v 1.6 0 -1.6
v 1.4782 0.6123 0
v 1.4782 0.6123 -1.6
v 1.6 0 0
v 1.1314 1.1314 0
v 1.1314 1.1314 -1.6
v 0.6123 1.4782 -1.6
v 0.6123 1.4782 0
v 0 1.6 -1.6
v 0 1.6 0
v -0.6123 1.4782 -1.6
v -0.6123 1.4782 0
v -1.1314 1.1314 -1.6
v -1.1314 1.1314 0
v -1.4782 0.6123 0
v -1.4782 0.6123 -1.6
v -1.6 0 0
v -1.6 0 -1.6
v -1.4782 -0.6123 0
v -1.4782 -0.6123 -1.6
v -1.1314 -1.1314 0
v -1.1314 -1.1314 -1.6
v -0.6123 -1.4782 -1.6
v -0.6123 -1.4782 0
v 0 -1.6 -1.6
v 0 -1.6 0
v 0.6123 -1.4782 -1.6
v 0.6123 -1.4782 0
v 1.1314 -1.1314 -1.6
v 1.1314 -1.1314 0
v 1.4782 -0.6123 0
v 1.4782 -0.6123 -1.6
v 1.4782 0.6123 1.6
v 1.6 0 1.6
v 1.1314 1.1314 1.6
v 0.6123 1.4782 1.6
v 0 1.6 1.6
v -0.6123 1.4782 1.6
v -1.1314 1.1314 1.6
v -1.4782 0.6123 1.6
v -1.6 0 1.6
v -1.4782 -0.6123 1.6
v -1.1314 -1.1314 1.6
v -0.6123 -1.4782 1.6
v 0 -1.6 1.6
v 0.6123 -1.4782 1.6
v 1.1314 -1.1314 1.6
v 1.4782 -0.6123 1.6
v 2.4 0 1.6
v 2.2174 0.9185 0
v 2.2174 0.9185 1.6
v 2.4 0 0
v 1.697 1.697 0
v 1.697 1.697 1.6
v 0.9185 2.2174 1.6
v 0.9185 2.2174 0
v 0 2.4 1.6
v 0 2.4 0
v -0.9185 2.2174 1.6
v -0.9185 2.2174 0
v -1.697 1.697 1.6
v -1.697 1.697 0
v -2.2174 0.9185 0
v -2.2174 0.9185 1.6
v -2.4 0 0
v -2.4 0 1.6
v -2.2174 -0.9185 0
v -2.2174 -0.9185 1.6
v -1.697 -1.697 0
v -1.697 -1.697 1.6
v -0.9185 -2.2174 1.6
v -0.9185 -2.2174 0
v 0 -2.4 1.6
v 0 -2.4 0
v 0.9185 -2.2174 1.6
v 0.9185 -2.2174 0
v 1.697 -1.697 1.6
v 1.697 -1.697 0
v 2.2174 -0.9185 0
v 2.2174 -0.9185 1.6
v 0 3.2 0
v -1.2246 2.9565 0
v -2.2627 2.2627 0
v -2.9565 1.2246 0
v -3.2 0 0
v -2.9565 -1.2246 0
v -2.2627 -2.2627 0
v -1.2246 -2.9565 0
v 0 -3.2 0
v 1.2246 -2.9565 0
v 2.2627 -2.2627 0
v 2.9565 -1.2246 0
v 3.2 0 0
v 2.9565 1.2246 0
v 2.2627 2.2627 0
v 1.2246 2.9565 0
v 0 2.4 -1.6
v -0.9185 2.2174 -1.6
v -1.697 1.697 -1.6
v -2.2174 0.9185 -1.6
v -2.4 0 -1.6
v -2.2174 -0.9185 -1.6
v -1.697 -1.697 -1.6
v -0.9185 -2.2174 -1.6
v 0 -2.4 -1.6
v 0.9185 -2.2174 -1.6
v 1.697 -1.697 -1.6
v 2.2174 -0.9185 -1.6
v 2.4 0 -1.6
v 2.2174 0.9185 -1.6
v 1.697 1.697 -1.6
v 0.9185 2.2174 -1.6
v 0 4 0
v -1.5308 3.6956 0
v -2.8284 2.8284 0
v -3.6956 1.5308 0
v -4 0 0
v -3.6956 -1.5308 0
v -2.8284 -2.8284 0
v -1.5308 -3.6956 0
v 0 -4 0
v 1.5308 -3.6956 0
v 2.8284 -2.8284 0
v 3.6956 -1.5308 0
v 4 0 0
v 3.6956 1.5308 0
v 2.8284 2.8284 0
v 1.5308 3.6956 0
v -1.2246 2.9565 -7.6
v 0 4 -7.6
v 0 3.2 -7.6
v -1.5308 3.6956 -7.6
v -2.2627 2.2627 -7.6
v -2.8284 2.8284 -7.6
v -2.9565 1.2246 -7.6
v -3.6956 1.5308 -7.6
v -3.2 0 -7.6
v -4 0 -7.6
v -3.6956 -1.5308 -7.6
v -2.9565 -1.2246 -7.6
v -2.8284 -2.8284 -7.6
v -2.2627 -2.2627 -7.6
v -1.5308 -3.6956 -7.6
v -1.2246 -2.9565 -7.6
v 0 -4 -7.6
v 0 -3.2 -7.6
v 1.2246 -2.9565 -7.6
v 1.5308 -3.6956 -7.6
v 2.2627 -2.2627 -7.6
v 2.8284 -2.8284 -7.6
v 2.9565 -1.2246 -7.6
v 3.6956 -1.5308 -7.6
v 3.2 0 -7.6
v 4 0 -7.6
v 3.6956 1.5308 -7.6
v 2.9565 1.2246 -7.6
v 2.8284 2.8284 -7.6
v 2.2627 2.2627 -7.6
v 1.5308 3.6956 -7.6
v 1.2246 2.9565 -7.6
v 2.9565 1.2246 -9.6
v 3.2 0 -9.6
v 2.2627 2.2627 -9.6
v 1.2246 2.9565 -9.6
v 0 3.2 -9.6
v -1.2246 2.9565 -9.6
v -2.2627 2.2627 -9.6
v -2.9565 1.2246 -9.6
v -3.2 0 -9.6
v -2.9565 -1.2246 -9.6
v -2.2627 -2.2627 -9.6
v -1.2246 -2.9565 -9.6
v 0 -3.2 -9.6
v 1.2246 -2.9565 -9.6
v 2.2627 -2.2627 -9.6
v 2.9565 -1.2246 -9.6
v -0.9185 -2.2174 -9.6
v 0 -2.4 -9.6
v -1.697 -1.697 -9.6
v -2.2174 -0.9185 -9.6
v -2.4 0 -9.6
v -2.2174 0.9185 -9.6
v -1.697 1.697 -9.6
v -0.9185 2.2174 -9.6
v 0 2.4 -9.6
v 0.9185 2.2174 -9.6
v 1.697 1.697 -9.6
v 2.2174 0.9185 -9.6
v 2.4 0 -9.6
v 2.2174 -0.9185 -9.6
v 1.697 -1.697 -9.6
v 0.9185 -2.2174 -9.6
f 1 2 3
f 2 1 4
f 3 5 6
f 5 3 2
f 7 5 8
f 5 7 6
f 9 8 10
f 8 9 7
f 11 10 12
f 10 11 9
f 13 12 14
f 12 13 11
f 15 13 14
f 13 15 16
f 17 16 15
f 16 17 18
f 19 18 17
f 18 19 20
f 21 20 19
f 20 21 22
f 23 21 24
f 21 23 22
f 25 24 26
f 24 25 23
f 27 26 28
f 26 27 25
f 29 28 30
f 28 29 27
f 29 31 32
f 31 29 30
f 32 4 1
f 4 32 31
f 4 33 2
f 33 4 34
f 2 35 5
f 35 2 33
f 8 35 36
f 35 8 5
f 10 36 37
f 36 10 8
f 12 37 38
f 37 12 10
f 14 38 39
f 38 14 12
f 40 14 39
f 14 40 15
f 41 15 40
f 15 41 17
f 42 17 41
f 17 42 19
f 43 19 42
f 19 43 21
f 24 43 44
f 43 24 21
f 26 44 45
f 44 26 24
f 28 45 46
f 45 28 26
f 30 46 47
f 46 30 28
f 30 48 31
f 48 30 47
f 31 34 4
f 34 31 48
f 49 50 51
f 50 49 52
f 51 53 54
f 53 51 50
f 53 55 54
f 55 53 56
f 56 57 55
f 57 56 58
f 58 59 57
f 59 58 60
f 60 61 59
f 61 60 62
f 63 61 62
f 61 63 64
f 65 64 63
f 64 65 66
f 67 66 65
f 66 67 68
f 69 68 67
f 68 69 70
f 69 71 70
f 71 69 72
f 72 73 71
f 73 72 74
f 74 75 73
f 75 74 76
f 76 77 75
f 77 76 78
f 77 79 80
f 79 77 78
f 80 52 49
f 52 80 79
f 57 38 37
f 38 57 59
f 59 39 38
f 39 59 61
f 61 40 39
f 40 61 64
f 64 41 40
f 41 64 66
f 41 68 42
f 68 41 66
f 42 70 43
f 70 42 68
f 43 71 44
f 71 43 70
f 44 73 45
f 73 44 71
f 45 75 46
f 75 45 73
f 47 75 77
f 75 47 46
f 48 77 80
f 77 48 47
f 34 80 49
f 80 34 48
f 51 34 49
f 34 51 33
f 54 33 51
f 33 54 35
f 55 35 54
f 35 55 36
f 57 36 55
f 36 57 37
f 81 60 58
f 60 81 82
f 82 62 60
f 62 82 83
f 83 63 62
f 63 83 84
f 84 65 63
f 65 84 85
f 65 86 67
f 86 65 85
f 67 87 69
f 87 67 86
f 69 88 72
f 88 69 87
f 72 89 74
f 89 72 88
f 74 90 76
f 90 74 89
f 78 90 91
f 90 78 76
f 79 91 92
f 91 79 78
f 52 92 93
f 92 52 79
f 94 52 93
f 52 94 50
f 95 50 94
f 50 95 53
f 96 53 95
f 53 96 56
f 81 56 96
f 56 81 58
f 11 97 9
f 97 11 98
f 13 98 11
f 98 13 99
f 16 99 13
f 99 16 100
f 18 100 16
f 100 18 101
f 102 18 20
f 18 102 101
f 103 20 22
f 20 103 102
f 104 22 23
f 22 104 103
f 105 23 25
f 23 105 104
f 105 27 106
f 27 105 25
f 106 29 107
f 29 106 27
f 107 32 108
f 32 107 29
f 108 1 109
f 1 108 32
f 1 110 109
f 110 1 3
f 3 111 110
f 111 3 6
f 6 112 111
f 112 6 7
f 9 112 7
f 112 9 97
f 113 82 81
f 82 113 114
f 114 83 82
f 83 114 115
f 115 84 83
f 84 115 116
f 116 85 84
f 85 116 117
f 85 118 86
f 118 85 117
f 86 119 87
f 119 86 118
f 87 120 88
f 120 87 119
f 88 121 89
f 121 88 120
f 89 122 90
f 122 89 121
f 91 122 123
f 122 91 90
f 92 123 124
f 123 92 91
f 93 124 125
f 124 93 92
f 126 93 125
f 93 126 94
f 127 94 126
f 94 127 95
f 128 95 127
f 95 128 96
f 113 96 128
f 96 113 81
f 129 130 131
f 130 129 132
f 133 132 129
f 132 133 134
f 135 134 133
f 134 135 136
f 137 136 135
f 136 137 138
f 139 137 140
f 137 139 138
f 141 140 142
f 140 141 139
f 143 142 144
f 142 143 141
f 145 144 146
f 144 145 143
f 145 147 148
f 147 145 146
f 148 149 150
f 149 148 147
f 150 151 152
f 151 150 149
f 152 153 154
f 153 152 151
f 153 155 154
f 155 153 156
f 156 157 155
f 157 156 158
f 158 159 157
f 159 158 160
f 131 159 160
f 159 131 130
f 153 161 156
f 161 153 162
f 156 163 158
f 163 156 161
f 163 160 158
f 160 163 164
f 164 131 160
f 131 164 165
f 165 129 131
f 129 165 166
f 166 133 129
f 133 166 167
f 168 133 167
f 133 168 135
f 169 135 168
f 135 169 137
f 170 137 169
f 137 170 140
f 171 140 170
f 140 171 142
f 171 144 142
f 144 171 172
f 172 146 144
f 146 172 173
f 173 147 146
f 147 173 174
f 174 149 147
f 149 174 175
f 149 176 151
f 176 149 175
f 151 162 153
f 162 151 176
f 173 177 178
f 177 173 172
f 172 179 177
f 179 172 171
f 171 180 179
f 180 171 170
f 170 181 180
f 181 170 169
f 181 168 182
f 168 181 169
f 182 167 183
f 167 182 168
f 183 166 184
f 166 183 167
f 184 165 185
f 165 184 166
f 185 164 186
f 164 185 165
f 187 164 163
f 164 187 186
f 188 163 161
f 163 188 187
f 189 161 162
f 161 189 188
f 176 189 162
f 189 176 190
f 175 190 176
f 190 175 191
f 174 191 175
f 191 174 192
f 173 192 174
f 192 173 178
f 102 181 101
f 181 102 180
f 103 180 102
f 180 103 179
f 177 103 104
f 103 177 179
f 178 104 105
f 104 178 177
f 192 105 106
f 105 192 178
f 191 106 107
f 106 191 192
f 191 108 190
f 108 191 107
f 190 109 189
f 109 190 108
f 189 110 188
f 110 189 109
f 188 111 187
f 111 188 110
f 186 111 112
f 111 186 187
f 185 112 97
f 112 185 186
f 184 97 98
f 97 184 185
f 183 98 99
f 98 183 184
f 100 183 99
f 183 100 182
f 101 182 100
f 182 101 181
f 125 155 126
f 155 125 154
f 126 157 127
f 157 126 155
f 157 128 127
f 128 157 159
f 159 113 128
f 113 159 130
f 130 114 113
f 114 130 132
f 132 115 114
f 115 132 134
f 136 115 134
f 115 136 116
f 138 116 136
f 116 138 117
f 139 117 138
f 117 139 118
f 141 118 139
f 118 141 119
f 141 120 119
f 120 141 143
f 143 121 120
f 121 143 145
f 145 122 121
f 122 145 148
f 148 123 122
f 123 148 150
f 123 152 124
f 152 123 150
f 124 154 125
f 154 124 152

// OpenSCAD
// file: ../p/stud4od.scad
use <../lib.scad>
use <4-4cylo.scad>
use <4-4ring3.scad>
function ldraw_lib__stud4od() = [
// 0 Stud Tube Open without Outer Cylinder and Top Surface
// 0 Name: stud4od.dat
// 0 Author: Philippe Hurbain [Philo]
// 0 !LDRAW_ORG Primitive UPDATE 2013-02
// 0 !LICENSE Licensed under CC BY 2.0 and CC BY 4.0 : see CAreadme.txt
// 
// 0 !HELP This stud is a "antistud" to be used like a underside stud,
// 0 !HELP but without the outer cylinder.
// 0 !HELP 1 47 0 0 0 1 0 0 0 1 0 0 0 1 stud4.dat
// 
// 0 BFC CERTIFY CCW
  [0,"BFC","CERTIFY"],
  [0,"BFC","CCW"],
// 
// 0 !HISTORY 2013-12-23 [PTadmin] Official Update 2013-02
// 
// 
// 1 16 0 -4 0 2 0 0 0 1 0 0 0 2 4-4ring3.dat
  [1,16,0,-4,0,2,0,0,0,1,0,0,0,2, ldraw_lib__4_4ring3()],
// 0 BFC INVERTNEXT
  [0,"BFC","INVERTNEXT"],
// 1 16 0 0 0 -6 0 0 0 -4 0 0 0 6 4-4cylo.dat
  [1,16,0,0,0,-6,0,0,0,-4,0,0,0,6, ldraw_lib__4_4cylo()],
];
makepoly(ldraw_lib__stud4od(), line=0.2);
// file: ../p/stud2a.scad
use <../lib.scad>
use <4-4cyli.scad>
use <4-4edge.scad>
use <4-4ring2.scad>
function ldraw_lib__stud2a() = [
// 0 Stud Open without Base Edges
// 0 Name: stud2a.dat
// 0 Author: James Jessiman
// 0 !LDRAW_ORG Primitive UPDATE 2009-02
// 0 !LICENSE Licensed under CC BY 2.0 and CC BY 4.0 : see CAreadme.txt
// 
// 0 BFC CERTIFY CCW
  [0,"BFC","CERTIFY"],
  [0,"BFC","CCW"],
// 
// 0 !HISTORY 1999-07-05 [PTadmin] Official Update 1999-05
// 0 !HISTORY 2002-04-04 [sbliss] Modified for BFC compliance
// 0 !HISTORY 2002-04-25 [PTadmin] Official Update 2002-02
// 0 !HISTORY 2007-06-24 [PTadmin] Header formatted for Contributor Agreement
// 0 !HISTORY 2008-07-01 [PTadmin] Official Update 2008-01
// 0 !HISTORY 2009-06-21 [cwdee] Update ring references to 4-4ring
// 0 !HISTORY 2009-09-03 [PTadmin] Official Update 2009-02
// 
// 
// 1 16 0 -4 0 4 0 0 0 1 0 0 0 4 4-4edge.dat
  [1,16,0,-4,0,4,0,0,0,1,0,0,0,4, ldraw_lib__4_4edge()],
// 1 16 0 -4 0 6 0 0 0 1 0 0 0 6 4-4edge.dat
  [1,16,0,-4,0,6,0,0,0,1,0,0,0,6, ldraw_lib__4_4edge()],
// 0 BFC INVERTNEXT
  [0,"BFC","INVERTNEXT"],
// 1 16 0 -4 0 4 0 0 0 4 0 0 0 4 4-4cyli.dat
  [1,16,0,-4,0,4,0,0,0,4,0,0,0,4, ldraw_lib__4_4cyli()],
// 1 16 0 -4 0 6 0 0 0 4 0 0 0 6 4-4cyli.dat
  [1,16,0,-4,0,6,0,0,0,4,0,0,0,6, ldraw_lib__4_4cyli()],
// 1 16 0 -4 0 2 0 0 0 1 0 0 0 2 4-4ring2.dat
  [1,16,0,-4,0,2,0,0,0,1,0,0,0,2, ldraw_lib__4_4ring2()],
// 0
];
makepoly(ldraw_lib__stud2a(), line=0.2);
// file: ../p/4-4ring4.scad
use <../lib.scad>
function ldraw_lib__4_4ring4() = [
// 0 Ring  4 x 1.0
// 0 Name: 4-4ring4.dat
// 0 Author: James Jessiman
// 0 !LDRAW_ORG Primitive UPDATE 2009-01
// 0 !LICENSE Licensed under CC BY 2.0 and CC BY 4.0 : see CAreadme.txt
// 
// 0 BFC CERTIFY CCW
  [0,"BFC","CERTIFY"],
  [0,"BFC","CCW"],
// 
// 0 !HISTORY 1998-12-15 [PTadmin] Official Update 1998-10
// 0 !HISTORY 2002-04-08 [BrickCaster] Modified for BFC compliance
// 0 !HISTORY 2002-04-25 [PTadmin] Official Update 2002-02
// 0 !HISTORY 2007-06-24 [PTadmin] Header formatted for Contributor Agreement
// 0 !HISTORY 2008-07-01 [PTadmin] Official Update 2008-01
// 0 !HISTORY 2008-08-26 [cwdee] Switch polygon winding and rename
// 0 !HISTORY 2009-05-02 [PTadmin] Official Update 2009-01
// 
// 
// 4 16 -1.9135 0 4.6195 -1.5308 0 3.6956 0 0 4 0 0 5
  [4,16,-1.9135,0,4.6195,-1.5308,0,3.6956,0,0,4,0,0,5],
// 4 16 -3.5355 0 3.5355 -2.8284 0 2.8284 -1.5308 0 3.6956 -1.9135 0 4.6195
  [4,16,-3.5355,0,3.5355,-2.8284,0,2.8284,-1.5308,0,3.6956,-1.9135,0,4.6195],
// 4 16 -4.6195 0 1.9135 -3.6956 0 1.5308 -2.8284 0 2.8284 -3.5355 0 3.5355
  [4,16,-4.6195,0,1.9135,-3.6956,0,1.5308,-2.8284,0,2.8284,-3.5355,0,3.5355],
// 4 16 -5 0 0 -4 0 0 -3.6956 0 1.5308 -4.6195 0 1.9135
  [4,16,-5,0,0,-4,0,0,-3.6956,0,1.5308,-4.6195,0,1.9135],
// 4 16 -4.6195 0 -1.9135 -3.6956 0 -1.5308 -4 0 0 -5 0 0
  [4,16,-4.6195,0,-1.9135,-3.6956,0,-1.5308,-4,0,0,-5,0,0],
// 4 16 -3.5355 0 -3.5355 -2.8284 0 -2.8284 -3.6956 0 -1.5308 -4.6195 0 -1.9135
  [4,16,-3.5355,0,-3.5355,-2.8284,0,-2.8284,-3.6956,0,-1.5308,-4.6195,0,-1.9135],
// 4 16 -1.9135 0 -4.6195 -1.5308 0 -3.6956 -2.8284 0 -2.8284 -3.5355 0 -3.5355
  [4,16,-1.9135,0,-4.6195,-1.5308,0,-3.6956,-2.8284,0,-2.8284,-3.5355,0,-3.5355],
// 4 16 0 0 -5 0 0 -4 -1.5308 0 -3.6956 -1.9135 0 -4.6195
  [4,16,0,0,-5,0,0,-4,-1.5308,0,-3.6956,-1.9135,0,-4.6195],
// 4 16 1.9135 0 -4.6195 1.5308 0 -3.6956 0 0 -4 0 0 -5
  [4,16,1.9135,0,-4.6195,1.5308,0,-3.6956,0,0,-4,0,0,-5],
// 4 16 3.5355 0 -3.5355 2.8284 0 -2.8284 1.5308 0 -3.6956 1.9135 0 -4.6195
  [4,16,3.5355,0,-3.5355,2.8284,0,-2.8284,1.5308,0,-3.6956,1.9135,0,-4.6195],
// 4 16 4.6195 0 -1.9135 3.6956 0 -1.5308 2.8284 0 -2.8284 3.5355 0 -3.5355
  [4,16,4.6195,0,-1.9135,3.6956,0,-1.5308,2.8284,0,-2.8284,3.5355,0,-3.5355],
// 4 16 5 0 0 4 0 0 3.6956 0 -1.5308 4.6195 0 -1.9135
  [4,16,5,0,0,4,0,0,3.6956,0,-1.5308,4.6195,0,-1.9135],
// 4 16 4.6195 0 1.9135 3.6956 0 1.5308 4 0 0 5 0 0
  [4,16,4.6195,0,1.9135,3.6956,0,1.5308,4,0,0,5,0,0],
// 4 16 3.5355 0 3.5355 2.8284 0 2.8284 3.6956 0 1.5308 4.6195 0 1.9135
  [4,16,3.5355,0,3.5355,2.8284,0,2.8284,3.6956,0,1.5308,4.6195,0,1.9135],
// 4 16 1.9135 0 4.6195 1.5308 0 3.6956 2.8284 0 2.8284 3.5355 0 3.5355
  [4,16,1.9135,0,4.6195,1.5308,0,3.6956,2.8284,0,2.8284,3.5355,0,3.5355],
// 4 16 0 0 5 0 0 4 1.5308 0 3.6956 1.9135 0 4.6195
  [4,16,0,0,5,0,0,4,1.5308,0,3.6956,1.9135,0,4.6195],
// 0
];
makepoly(ldraw_lib__4_4ring4(), line=0.2);
// file: ../p/4-4ring3.scad
use <../lib.scad>
function ldraw_lib__4_4ring3() = [
// 0 Ring  3 x 1.0
// 0 Name: 4-4ring3.dat
// 0 Author: James Jessiman
// 0 !LDRAW_ORG Primitive UPDATE 2009-01
// 0 !LICENSE Licensed under CC BY 2.0 and CC BY 4.0 : see CAreadme.txt
// 
// 0 BFC CERTIFY CCW
  [0,"BFC","CERTIFY"],
  [0,"BFC","CCW"],
// 
// 0 !HISTORY 1998-12-15 [PTadmin] Official Update 1998-10
// 0 !HISTORY 2002-04-05 [hafhead] Added BFC statement
// 0 !HISTORY 2002-04-25 [PTadmin] Official Update 2002-02
// 0 !HISTORY 2007-06-24 [PTadmin] Header formatted for Contributor Agreement
// 0 !HISTORY 2008-07-01 [PTadmin] Official Update 2008-01
// 0 !HISTORY 2008-08-26 [cwdee] Switch polygon winding and rename
// 0 !HISTORY 2009-05-02 [PTadmin] Official Update 2009-01
// 
// 
// 4 16 -1.5308 0 3.6956 -1.1481 0 2.7717 0 0 3 0 0 4
  [4,16,-1.5308,0,3.6956,-1.1481,0,2.7717,0,0,3,0,0,4],
// 4 16 -2.8284 0 2.8284 -2.1213 0 2.1213 -1.1481 0 2.7717 -1.5308 0 3.6956
  [4,16,-2.8284,0,2.8284,-2.1213,0,2.1213,-1.1481,0,2.7717,-1.5308,0,3.6956],
// 4 16 -3.6956 0 1.5308 -2.7717 0 1.1481 -2.1213 0 2.1213 -2.8284 0 2.8284
  [4,16,-3.6956,0,1.5308,-2.7717,0,1.1481,-2.1213,0,2.1213,-2.8284,0,2.8284],
// 4 16 -4 0 0 -3 0 0 -2.7717 0 1.1481 -3.6956 0 1.5308
  [4,16,-4,0,0,-3,0,0,-2.7717,0,1.1481,-3.6956,0,1.5308],
// 4 16 -3.6956 0 -1.5308 -2.7717 0 -1.1481 -3 0 0 -4 0 0
  [4,16,-3.6956,0,-1.5308,-2.7717,0,-1.1481,-3,0,0,-4,0,0],
// 4 16 -2.8284 0 -2.8284 -2.1213 0 -2.1213 -2.7717 0 -1.1481 -3.6956 0 -1.5308
  [4,16,-2.8284,0,-2.8284,-2.1213,0,-2.1213,-2.7717,0,-1.1481,-3.6956,0,-1.5308],
// 4 16 -1.5308 0 -3.6956 -1.1481 0 -2.7717 -2.1213 0 -2.1213 -2.8284 0 -2.8284
  [4,16,-1.5308,0,-3.6956,-1.1481,0,-2.7717,-2.1213,0,-2.1213,-2.8284,0,-2.8284],
// 4 16 0 0 -4 0 0 -3 -1.1481 0 -2.7717 -1.5308 0 -3.6956
  [4,16,0,0,-4,0,0,-3,-1.1481,0,-2.7717,-1.5308,0,-3.6956],
// 4 16 1.5308 0 -3.6956 1.1481 0 -2.7717 0 0 -3 0 0 -4
  [4,16,1.5308,0,-3.6956,1.1481,0,-2.7717,0,0,-3,0,0,-4],
// 4 16 2.8284 0 -2.8284 2.1213 0 -2.1213 1.1481 0 -2.7717 1.5308 0 -3.6956
  [4,16,2.8284,0,-2.8284,2.1213,0,-2.1213,1.1481,0,-2.7717,1.5308,0,-3.6956],
// 4 16 3.6956 0 -1.5308 2.7717 0 -1.1481 2.1213 0 -2.1213 2.8284 0 -2.8284
  [4,16,3.6956,0,-1.5308,2.7717,0,-1.1481,2.1213,0,-2.1213,2.8284,0,-2.8284],
// 4 16 4 0 0 3 0 0 2.7717 0 -1.1481 3.6956 0 -1.5308
  [4,16,4,0,0,3,0,0,2.7717,0,-1.1481,3.6956,0,-1.5308],
// 4 16 3.6956 0 1.5308 2.7717 0 1.1481 3 0 0 4 0 0
  [4,16,3.6956,0,1.5308,2.7717,0,1.1481,3,0,0,4,0,0],
// 4 16 2.8284 0 2.8284 2.1213 0 2.1213 2.7717 0 1.1481 3.6956 0 1.5308
  [4,16,2.8284,0,2.8284,2.1213,0,2.1213,2.7717,0,1.1481,3.6956,0,1.5308],
// 4 16 1.5308 0 3.6956 1.1481 0 2.7717 2.1213 0 2.1213 2.8284 0 2.8284
  [4,16,1.5308,0,3.6956,1.1481,0,2.7717,2.1213,0,2.1213,2.8284,0,2.8284],
// 4 16 0 0 4 0 0 3 1.1481 0 2.7717 1.5308 0 3.6956
  [4,16,0,0,4,0,0,3,1.1481,0,2.7717,1.5308,0,3.6956],
// 0
];
makepoly(ldraw_lib__4_4ring3(), line=0.2);
// file: ../p/4-4ring2.scad
use <../lib.scad>
function ldraw_lib__4_4ring2() = [
// 0 Ring  2 x 1.0
// 0 Name: 4-4ring2.dat
// 0 Author: James Jessiman
// 0 !LDRAW_ORG Primitive UPDATE 2009-01
// 0 !LICENSE Licensed under CC BY 2.0 and CC BY 4.0 : see CAreadme.txt
// 
// 0 BFC CERTIFY CCW
  [0,"BFC","CERTIFY"],
  [0,"BFC","CCW"],
// 
// 0 !HISTORY 1998-12-15 [PTadmin] Official Update 1998-10
// 0 !HISTORY 2002-04-05 [hafhead] Added BFC statement
// 0 !HISTORY 2002-04-25 [PTadmin] Official Update 2002-02
// 0 !HISTORY 2007-06-24 [PTadmin] Header formatted for Contributor Agreement
// 0 !HISTORY 2008-07-01 [PTadmin] Official Update 2008-01
// 0 !HISTORY 2008-08-26 [cwdee] Switch polygon winding and rename
// 0 !HISTORY 2009-05-02 [PTadmin] Official Update 2009-01
// 
// 
// 4 16 -1.1481 0 2.7717 -0.7654 0 1.8478 0 0 2 0 0 3
  [4,16,-1.1481,0,2.7717,-0.7654,0,1.8478,0,0,2,0,0,3],
// 4 16 -2.1213 0 2.1213 -1.4142 0 1.4142 -0.7654 0 1.8478 -1.1481 0 2.7717
  [4,16,-2.1213,0,2.1213,-1.4142,0,1.4142,-0.7654,0,1.8478,-1.1481,0,2.7717],
// 4 16 -2.7717 0 1.1481 -1.8478 0 0.7654 -1.4142 0 1.4142 -2.1213 0 2.1213
  [4,16,-2.7717,0,1.1481,-1.8478,0,0.7654,-1.4142,0,1.4142,-2.1213,0,2.1213],
// 4 16 -3 0 0 -2 0 0 -1.8478 0 0.7654 -2.7717 0 1.1481
  [4,16,-3,0,0,-2,0,0,-1.8478,0,0.7654,-2.7717,0,1.1481],
// 4 16 -2.7717 0 -1.1481 -1.8478 0 -0.7654 -2 0 0 -3 0 0
  [4,16,-2.7717,0,-1.1481,-1.8478,0,-0.7654,-2,0,0,-3,0,0],
// 4 16 -2.1213 0 -2.1213 -1.4142 0 -1.4142 -1.8478 0 -0.7654 -2.7717 0 -1.1481
  [4,16,-2.1213,0,-2.1213,-1.4142,0,-1.4142,-1.8478,0,-0.7654,-2.7717,0,-1.1481],
// 4 16 -1.1481 0 -2.7717 -0.7654 0 -1.8478 -1.4142 0 -1.4142 -2.1213 0 -2.1213
  [4,16,-1.1481,0,-2.7717,-0.7654,0,-1.8478,-1.4142,0,-1.4142,-2.1213,0,-2.1213],
// 4 16 0 0 -3 0 0 -2 -0.7654 0 -1.8478 -1.1481 0 -2.7717
  [4,16,0,0,-3,0,0,-2,-0.7654,0,-1.8478,-1.1481,0,-2.7717],
// 4 16 1.1481 0 -2.7717 0.7654 0 -1.8478 0 0 -2 0 0 -3
  [4,16,1.1481,0,-2.7717,0.7654,0,-1.8478,0,0,-2,0,0,-3],
// 4 16 2.1213 0 -2.1213 1.4142 0 -1.4142 0.7654 0 -1.8478 1.1481 0 -2.7717
  [4,16,2.1213,0,-2.1213,1.4142,0,-1.4142,0.7654,0,-1.8478,1.1481,0,-2.7717],
// 4 16 2.7717 0 -1.1481 1.8478 0 -0.7654 1.4142 0 -1.4142 2.1213 0 -2.1213
  [4,16,2.7717,0,-1.1481,1.8478,0,-0.7654,1.4142,0,-1.4142,2.1213,0,-2.1213],
// 4 16 3 0 0 2 0 0 1.8478 0 -0.7654 2.7717 0 -1.1481
  [4,16,3,0,0,2,0,0,1.8478,0,-0.7654,2.7717,0,-1.1481],
// 4 16 2.7717 0 1.1481 1.8478 0 0.7654 2 0 0 3 0 0
  [4,16,2.7717,0,1.1481,1.8478,0,0.7654,2,0,0,3,0,0],
// 4 16 2.1213 0 2.1213 1.4142 0 1.4142 1.8478 0 0.7654 2.7717 0 1.1481
  [4,16,2.1213,0,2.1213,1.4142,0,1.4142,1.8478,0,0.7654,2.7717,0,1.1481],
// 4 16 1.1481 0 2.7717 0.7654 0 1.8478 1.4142 0 1.4142 2.1213 0 2.1213
  [4,16,1.1481,0,2.7717,0.7654,0,1.8478,1.4142,0,1.4142,2.1213,0,2.1213],
// 4 16 0 0 3 0 0 2 0.7654 0 1.8478 1.1481 0 2.7717
  [4,16,0,0,3,0,0,2,0.7654,0,1.8478,1.1481,0,2.7717],
// 0
];
makepoly(ldraw_lib__4_4ring2(), line=0.2);
// file: ../p/4-4edge.scad
use <../lib.scad>
function ldraw_lib__4_4edge() = [
// 0 Circle 1.0
// 0 Name: 4-4edge.dat
// 0 Author: James Jessiman
// 0 !LDRAW_ORG Primitive UPDATE 2017-01
// 0 !LICENSE Licensed under CC BY 2.0 and CC BY 4.0 : see CAreadme.txt
// 
// 0 BFC CERTIFY CCW
  [0,"BFC","CERTIFY"],
  [0,"BFC","CCW"],
// 
// 0 !HISTORY 1998-12-15 [PTadmin] Official Update 1998-10
// 0 !HISTORY 2005-12-28 [PTadmin] Official Update 2005-01
// 0 !HISTORY 2007-06-24 [PTadmin] Header formatted for Contributor Agreement
// 0 !HISTORY 2008-07-01 [PTadmin] Official Update 2008-01
// 0 !HISTORY 2017-01-15 [Steffen] BFCed
// 0 !HISTORY 2017-12-30 [PTadmin] Official Update 2017-01
// 
// 
// 2 24 1 0 0 0.9239 0 0.3827
  [2,24,1,0,0,0.9239,0,0.3827],
// 2 24 0.9239 0 0.3827 0.7071 0 0.7071
  [2,24,0.9239,0,0.3827,0.7071,0,0.7071],
// 2 24 0.7071 0 0.7071 0.3827 0 0.9239
  [2,24,0.7071,0,0.7071,0.3827,0,0.9239],
// 2 24 0.3827 0 0.9239 0 0 1
  [2,24,0.3827,0,0.9239,0,0,1],
// 2 24 0 0 1 -0.3827 0 0.9239
  [2,24,0,0,1,-0.3827,0,0.9239],
// 2 24 -0.3827 0 0.9239 -0.7071 0 0.7071
  [2,24,-0.3827,0,0.9239,-0.7071,0,0.7071],
// 2 24 -0.7071 0 0.7071 -0.9239 0 0.3827
  [2,24,-0.7071,0,0.7071,-0.9239,0,0.3827],
// 2 24 -0.9239 0 0.3827 -1 0 -0
  [2,24,-0.9239,0,0.3827,-1,0,-0],
// 2 24 -1 0 -0 -0.9239 0 -0.3827
  [2,24,-1,0,-0,-0.9239,0,-0.3827],
// 2 24 -0.9239 0 -0.3827 -0.7071 0 -0.7071
  [2,24,-0.9239,0,-0.3827,-0.7071,0,-0.7071],
// 2 24 -0.7071 0 -0.7071 -0.3827 0 -0.9239
  [2,24,-0.7071,0,-0.7071,-0.3827,0,-0.9239],
// 2 24 -0.3827 0 -0.9239 0 0 -1
  [2,24,-0.3827,0,-0.9239,0,0,-1],
// 2 24 0 0 -1 0.3827 0 -0.9239
  [2,24,0,0,-1,0.3827,0,-0.9239],
// 2 24 0.3827 0 -0.9239 0.7071 0 -0.7071
  [2,24,0.3827,0,-0.9239,0.7071,0,-0.7071],
// 2 24 0.7071 0 -0.7071 0.9239 0 -0.3827
  [2,24,0.7071,0,-0.7071,0.9239,0,-0.3827],
// 2 24 0.9239 0 -0.3827 1 0 0
  [2,24,0.9239,0,-0.3827,1,0,0],
];
makepoly(ldraw_lib__4_4edge(), line=0.2);
// file: ../p/4-4cylo.scad
use <../lib.scad>
use <4-4cyli.scad>
use <4-4edge.scad>
function ldraw_lib__4_4cylo() = [
// 0 Cylinder Open 1.0
// 0 Name: 4-4cylo.dat
// 0 Author: Mark Kennedy [mkennedy]
// 0 !LDRAW_ORG Primitive UPDATE 2010-01
// 0 !LICENSE Licensed under CC BY 2.0 and CC BY 4.0 : see CAreadme.txt
// 
// 0 BFC CERTIFY CCW
  [0,"BFC","CERTIFY"],
  [0,"BFC","CCW"],
// 
// 0 !HISTORY 2010-04-05 [PTadmin] Official Update 2010-01
// 
// 
// 1 16 0 0 0 1 0 0 0 1 0 0 0 1 4-4edge.dat
  [1,16,0,0,0,1,0,0,0,1,0,0,0,1, ldraw_lib__4_4edge()],
// 1 16 0 1 0 1 0 0 0 1 0 0 0 1 4-4edge.dat
  [1,16,0,1,0,1,0,0,0,1,0,0,0,1, ldraw_lib__4_4edge()],
// 1 16 0 0 0 1 0 0 0 1 0 0 0 1 4-4cyli.dat
  [1,16,0,0,0,1,0,0,0,1,0,0,0,1, ldraw_lib__4_4cyli()],
// 0
];
makepoly(ldraw_lib__4_4cylo(), line=0.2);
// file: s/3062bs01.scad
use <../../lib.scad>
use <../../p/4-4cyli.scad>
use <../../p/4-4cylo.scad>
use <../../p/4-4edge.scad>
use <../../p/4-4ring2.scad>
use <../../p/4-4ring3.scad>
use <../../p/4-4ring4.scad>
use <../../p/stud2a.scad>
use <../../p/stud4od.scad>
function ldraw_lib__s__3062bs01() = [
// 0 ~Brick  1 x  1 Round with Hollow Stud without Outer Surface
// 0 Name: s\3062bs01.dat
// 0 Author: Takeshi Takahashi [RainbowDolphin]
// 0 !LDRAW_ORG Subpart UPDATE 2022-02
// 0 !LICENSE Licensed under CC BY 2.0 and CC BY 4.0 : see CAreadme.txt
// 
// 0 BFC CERTIFY CCW
  [0,"BFC","CERTIFY"],
  [0,"BFC","CCW"],
// 
// 0 !HISTORY 2022-03-06 [PTadmin] Official Update 2022-02
// 
// 
// 1 16 0 4 0 4 0 0 0 1 0 0 0 4 4-4edge.dat
  [1,16,0,4,0,4,0,0,0,1,0,0,0,4, ldraw_lib__4_4edge()],
// 1 16 0 19 0 10 0 0 0 1 0 0 0 10 4-4edge.dat
  [1,16,0,19,0,10,0,0,0,1,0,0,0,10, ldraw_lib__4_4edge()],
// 1 16 0 0 0 10 0 0 0 1 0 0 0 10 4-4edge.dat
  [1,16,0,0,0,10,0,0,0,1,0,0,0,10, ldraw_lib__4_4edge()],
// 1 16 0 0 0 6 0 0 0 1 0 0 0 6 4-4edge.dat
  [1,16,0,0,0,6,0,0,0,1,0,0,0,6, ldraw_lib__4_4edge()],
// 0 BFC INVERTNEXT
  [0,"BFC","INVERTNEXT"],
// 1 16 0 0 0 4 0 0 0 4 0 0 0 4 4-4cyli.dat
  [1,16,0,0,0,4,0,0,0,4,0,0,0,4, ldraw_lib__4_4cyli()],
// 1 16 0 0 0 1 0 0 0 1 0 0 0 1 stud2a.dat
  [1,16,0,0,0,1,0,0,0,1,0,0,0,1, ldraw_lib__stud2a()],
// 1 16 0 0 0 2 0 0 0 1 0 0 0 2 4-4ring3.dat
  [1,16,0,0,0,2,0,0,0,1,0,0,0,2, ldraw_lib__4_4ring3()],
// 1 16 0 4 0 2 0 0 0 -1 0 0 0 2 4-4ring2.dat
  [1,16,0,4,0,2,0,0,0,-1,0,0,0,2, ldraw_lib__4_4ring2()],
// 1 16 0 0 0 2 0 0 0 1 0 0 0 2 4-4ring4.dat
  [1,16,0,0,0,2,0,0,0,1,0,0,0,2, ldraw_lib__4_4ring4()],
// 1 16 0 19 0 2 0 0 0 -1 0 0 0 2 4-4ring4.dat
  [1,16,0,19,0,2,0,0,0,-1,0,0,0,2, ldraw_lib__4_4ring4()],
// 1 16 0 19 0 8 0 0 0 5 0 0 0 8 4-4cylo.dat
  [1,16,0,19,0,8,0,0,0,5,0,0,0,8, ldraw_lib__4_4cylo()],
// 1 16 0 4 0 1 0 0 0 -5 0 0 0 -1 stud4od.dat
  [1,16,0,4,0,1,0,0,0,-5,0,0,0,-1, ldraw_lib__stud4od()],
];
makepoly(ldraw_lib__s__3062bs01(), line=0.2);
// file: ../p/4-4cyli.scad
use <../lib.scad>
function ldraw_lib__4_4cyli() = [
// 0 Cylinder 1.0
// 0 Name: 4-4cyli.dat
// 0 Author: James Jessiman
// 0 !LDRAW_ORG Primitive UPDATE 2005-01
// 0 !LICENSE Licensed under CC BY 2.0 and CC BY 4.0 : see CAreadme.txt
// 
// 0 BFC CERTIFY CCW
  [0,"BFC","CERTIFY"],
  [0,"BFC","CCW"],
// 
// 0 !HISTORY 1998-12-15 [PTadmin] Official Update 1998-10
// 0 !HISTORY 2002-03-23 [sbliss] Added BFC statement; merged headers from files in distributions LDraw 0.27 and Complete.
// 0 !HISTORY 2002-04-25 [PTadmin] Official Update 2002-02
// 0 !HISTORY 2004-12-14 [guyvivan] BFC CCW
// 0 !HISTORY 2005-12-28 [PTadmin] Official Update 2005-01
// 0 !HISTORY 2007-06-24 [PTadmin] Header formatted for Contributor Agreement
// 0 !HISTORY 2008-07-01 [PTadmin] Official Update 2008-01
// 
// 
// 4 16 1 1 0 0.9239 1 0.3827 0.9239 0 0.3827 1 0 0
  [4,16,1,1,0,0.9239,1,0.3827,0.9239,0,0.3827,1,0,0],
// 5 24 1 0 0 1 1 0 0.9239 0 0.3827 0.9239 0 -0.3827
  [5,24,1,0,0,1,1,0,0.9239,0,0.3827,0.9239,0,-0.3827],
// 4 16 0.9239 1 0.3827 0.7071 1 0.7071 0.7071 0 0.7071 0.9239 0 0.3827
  [4,16,0.9239,1,0.3827,0.7071,1,0.7071,0.7071,0,0.7071,0.9239,0,0.3827],
// 5 24 0.9239 0 0.3827 0.9239 1 0.3827 0.7071 0 0.7071 1 0 0
  [5,24,0.9239,0,0.3827,0.9239,1,0.3827,0.7071,0,0.7071,1,0,0],
// 4 16 0.7071 1 0.7071 0.3827 1 0.9239 0.3827 0 0.9239 0.7071 0 0.7071
  [4,16,0.7071,1,0.7071,0.3827,1,0.9239,0.3827,0,0.9239,0.7071,0,0.7071],
// 5 24 0.7071 0 0.7071 0.7071 1 0.7071 0.3827 0 0.9239 0.9239 0 0.3827
  [5,24,0.7071,0,0.7071,0.7071,1,0.7071,0.3827,0,0.9239,0.9239,0,0.3827],
// 4 16 0.3827 1 0.9239 0 1 1 0 0 1 0.3827 0 0.9239
  [4,16,0.3827,1,0.9239,0,1,1,0,0,1,0.3827,0,0.9239],
// 5 24 0.3827 0 0.9239 0.3827 1 0.9239 0 0 1 0.7071 0 0.7071
  [5,24,0.3827,0,0.9239,0.3827,1,0.9239,0,0,1,0.7071,0,0.7071],
// 4 16 0 1 1 -0.3827 1 0.9239 -0.3827 0 0.9239 0 0 1
  [4,16,0,1,1,-0.3827,1,0.9239,-0.3827,0,0.9239,0,0,1],
// 5 24 0 0 1 0 1 1 -0.3827 0 0.9239 0.3827 0 0.9239
  [5,24,0,0,1,0,1,1,-0.3827,0,0.9239,0.3827,0,0.9239],
// 4 16 -0.3827 1 0.9239 -0.7071 1 0.7071 -0.7071 0 0.7071 -0.3827 0 0.9239
  [4,16,-0.3827,1,0.9239,-0.7071,1,0.7071,-0.7071,0,0.7071,-0.3827,0,0.9239],
// 5 24 -0.3827 0 0.9239 -0.3827 1 0.9239 -0.7071 0 0.7071 0 0 1
  [5,24,-0.3827,0,0.9239,-0.3827,1,0.9239,-0.7071,0,0.7071,0,0,1],
// 4 16 -0.7071 1 0.7071 -0.9239 1 0.3827 -0.9239 0 0.3827 -0.7071 0 0.7071
  [4,16,-0.7071,1,0.7071,-0.9239,1,0.3827,-0.9239,0,0.3827,-0.7071,0,0.7071],
// 5 24 -0.7071 0 0.7071 -0.7071 1 0.7071 -0.9239 0 0.3827 -0.3827 0 0.9239
  [5,24,-0.7071,0,0.7071,-0.7071,1,0.7071,-0.9239,0,0.3827,-0.3827,0,0.9239],
// 4 16 -0.9239 1 0.3827 -1 1 0 -1 0 0 -0.9239 0 0.3827
  [4,16,-0.9239,1,0.3827,-1,1,0,-1,0,0,-0.9239,0,0.3827],
// 5 24 -0.9239 0 0.3827 -0.9239 1 0.3827 -1 0 0 -0.7071 0 0.7071
  [5,24,-0.9239,0,0.3827,-0.9239,1,0.3827,-1,0,0,-0.7071,0,0.7071],
// 4 16 -1 1 0 -0.9239 1 -0.3827 -0.9239 0 -0.3827 -1 0 0
  [4,16,-1,1,0,-0.9239,1,-0.3827,-0.9239,0,-0.3827,-1,0,0],
// 5 24 -1 0 0 -1 1 0 -0.9239 0 -0.3827 -0.9239 0 0.3827
  [5,24,-1,0,0,-1,1,0,-0.9239,0,-0.3827,-0.9239,0,0.3827],
// 4 16 -0.9239 1 -0.3827 -0.7071 1 -0.7071 -0.7071 0 -0.7071 -0.9239 0 -0.3827
  [4,16,-0.9239,1,-0.3827,-0.7071,1,-0.7071,-0.7071,0,-0.7071,-0.9239,0,-0.3827],
// 5 24 -0.9239 0 -0.3827 -0.9239 1 -0.3827 -0.7071 0 -0.7071 -1 0 0
  [5,24,-0.9239,0,-0.3827,-0.9239,1,-0.3827,-0.7071,0,-0.7071,-1,0,0],
// 4 16 -0.7071 1 -0.7071 -0.3827 1 -0.9239 -0.3827 0 -0.9239 -0.7071 0 -0.7071
  [4,16,-0.7071,1,-0.7071,-0.3827,1,-0.9239,-0.3827,0,-0.9239,-0.7071,0,-0.7071],
// 5 24 -0.7071 0 -0.7071 -0.7071 1 -0.7071 -0.3827 0 -0.9239 -0.9239 0 -0.3827
  [5,24,-0.7071,0,-0.7071,-0.7071,1,-0.7071,-0.3827,0,-0.9239,-0.9239,0,-0.3827],
// 4 16 -0.3827 1 -0.9239 0 1 -1 0 0 -1 -0.3827 0 -0.9239
  [4,16,-0.3827,1,-0.9239,0,1,-1,0,0,-1,-0.3827,0,-0.9239],
// 5 24 -0.3827 0 -0.9239 -0.3827 1 -0.9239 0 0 -1 -0.7071 0 -0.7071
  [5,24,-0.3827,0,-0.9239,-0.3827,1,-0.9239,0,0,-1,-0.7071,0,-0.7071],
// 4 16 0 1 -1 0.3827 1 -0.9239 0.3827 0 -0.9239 0 0 -1
  [4,16,0,1,-1,0.3827,1,-0.9239,0.3827,0,-0.9239,0,0,-1],
// 5 24 0 0 -1 0 1 -1 0.3827 0 -0.9239 -0.3827 0 -0.9239
  [5,24,0,0,-1,0,1,-1,0.3827,0,-0.9239,-0.3827,0,-0.9239],
// 4 16 0.3827 1 -0.9239 0.7071 1 -0.7071 0.7071 0 -0.7071 0.3827 0 -0.9239
  [4,16,0.3827,1,-0.9239,0.7071,1,-0.7071,0.7071,0,-0.7071,0.3827,0,-0.9239],
// 5 24 0.3827 0 -0.9239 0.3827 1 -0.9239 0.7071 0 -0.7071 0 0 -1
  [5,24,0.3827,0,-0.9239,0.3827,1,-0.9239,0.7071,0,-0.7071,0,0,-1],
// 4 16 0.7071 1 -0.7071 0.9239 1 -0.3827 0.9239 0 -0.3827 0.7071 0 -0.7071
  [4,16,0.7071,1,-0.7071,0.9239,1,-0.3827,0.9239,0,-0.3827,0.7071,0,-0.7071],
// 5 24 0.7071 0 -0.7071 0.7071 1 -0.7071 0.9239 0 -0.3827 0.3827 0 -0.9239
  [5,24,0.7071,0,-0.7071,0.7071,1,-0.7071,0.9239,0,-0.3827,0.3827,0,-0.9239],
// 4 16 0.9239 1 -0.3827 1 1 0 1 0 0 0.9239 0 -0.3827
  [4,16,0.9239,1,-0.3827,1,1,0,1,0,0,0.9239,0,-0.3827],
// 5 24 0.9239 0 -0.3827 0.9239 1 -0.3827 1 0 0 0.7071 0 -0.7071
  [5,24,0.9239,0,-0.3827,0.9239,1,-0.3827,1,0,0,0.7071,0,-0.7071],
// 0
];
makepoly(ldraw_lib__4_4cyli(), line=0.2);
// file: 3062b.scad
use <../lib.scad>
use <../p/4-4cyli.scad>
use <s/3062bs01.scad>
function ldraw_lib__3062b() = [
// 0 Brick  1 x  1 Round with Hollow Stud
// 0 Name: 3062b.dat
// 0 Author: James Jessiman
// 0 !LDRAW_ORG Part UPDATE 2022-02
// 0 !LICENSE Licensed under CC BY 2.0 and CC BY 4.0 : see CAreadme.txt
// 
// 0 BFC CERTIFY CCW
  [0,"BFC","CERTIFY"],
  [0,"BFC","CCW"],
// 
// 0 !HISTORY 1998-06-20 [PTadmin] Official Update 1998-06
// 0 !HISTORY 2003-08-02 [OrionP] Made some primitive subs
// 0 !HISTORY 2003-08-04 [Steffen] replaced peghole.dat by stud4a.dat
// 0 !HISTORY 2003-12-19 [PTadmin] Official Update 2003-03
// 0 !HISTORY 2007-06-10 [PTadmin] Header formatted for Contributor Agreement
// 0 !HISTORY 2008-07-01 [PTadmin] Official Update 2008-01
// 0 !HISTORY 2009-03-19 [tchang] Add missing <CR>
// 0 !HISTORY 2009-09-03 [PTadmin] Official Update 2009-02
// 0 !HISTORY 2020-12-12 [RainbowDolphin] Subparted for patterns
// 0 !HISTORY 2022-03-06 [PTadmin] Official Update 2022-02
// 
// 
// 1 16 0 0 0 1 0 0 0 1 0 0 0 1 s\3062bs01.dat
  [1,16,0,0,0,1,0,0,0,1,0,0,0,1, ldraw_lib__s__3062bs01()],
// 1 16 0 0 0 10 0 0 0 19 0 0 0 10 4-4cyli.dat
  [1,16,0,0,0,10,0,0,0,19,0,0,0,10, ldraw_lib__4_4cyli()],
];
makepoly(ldraw_lib__3062b(), line=0.2);
// main file
use <../lib.scad>
use <3062b.scad>
function ldraw_lib__18860() = [
// 0 =Brick  1 x  1 Round with Hollow Stud
// 0 Name: 18860.dat
// 0 Author: [PTadmin]
// 0 !LDRAW_ORG Part Alias UPDATE 2017-01
// 0 !LICENSE Licensed under CC BY 4.0 : see CAreadme.txt
// 
// 0 BFC CERTIFY CW
  [0,"BFC","CERTIFY"],
  [0,"BFC","CW"],
// 
// 0 !HISTORY 2017-12-30 [PTadmin] Official Update 2017-01
// 
// 
// 0 // Alias of 3062b
// 0 // Part 18860 is the metallic ink counterpart of 3062b
// 
// 1 16 0 0 0 1 0 0 0 1 0 0 0 1 3062b.dat
  [1,16,0,0,0,1,0,0,0,1,0,0,0,1, ldraw_lib__3062b()],
// 0
];
makepoly(ldraw_lib__18860(), line=0.2);
